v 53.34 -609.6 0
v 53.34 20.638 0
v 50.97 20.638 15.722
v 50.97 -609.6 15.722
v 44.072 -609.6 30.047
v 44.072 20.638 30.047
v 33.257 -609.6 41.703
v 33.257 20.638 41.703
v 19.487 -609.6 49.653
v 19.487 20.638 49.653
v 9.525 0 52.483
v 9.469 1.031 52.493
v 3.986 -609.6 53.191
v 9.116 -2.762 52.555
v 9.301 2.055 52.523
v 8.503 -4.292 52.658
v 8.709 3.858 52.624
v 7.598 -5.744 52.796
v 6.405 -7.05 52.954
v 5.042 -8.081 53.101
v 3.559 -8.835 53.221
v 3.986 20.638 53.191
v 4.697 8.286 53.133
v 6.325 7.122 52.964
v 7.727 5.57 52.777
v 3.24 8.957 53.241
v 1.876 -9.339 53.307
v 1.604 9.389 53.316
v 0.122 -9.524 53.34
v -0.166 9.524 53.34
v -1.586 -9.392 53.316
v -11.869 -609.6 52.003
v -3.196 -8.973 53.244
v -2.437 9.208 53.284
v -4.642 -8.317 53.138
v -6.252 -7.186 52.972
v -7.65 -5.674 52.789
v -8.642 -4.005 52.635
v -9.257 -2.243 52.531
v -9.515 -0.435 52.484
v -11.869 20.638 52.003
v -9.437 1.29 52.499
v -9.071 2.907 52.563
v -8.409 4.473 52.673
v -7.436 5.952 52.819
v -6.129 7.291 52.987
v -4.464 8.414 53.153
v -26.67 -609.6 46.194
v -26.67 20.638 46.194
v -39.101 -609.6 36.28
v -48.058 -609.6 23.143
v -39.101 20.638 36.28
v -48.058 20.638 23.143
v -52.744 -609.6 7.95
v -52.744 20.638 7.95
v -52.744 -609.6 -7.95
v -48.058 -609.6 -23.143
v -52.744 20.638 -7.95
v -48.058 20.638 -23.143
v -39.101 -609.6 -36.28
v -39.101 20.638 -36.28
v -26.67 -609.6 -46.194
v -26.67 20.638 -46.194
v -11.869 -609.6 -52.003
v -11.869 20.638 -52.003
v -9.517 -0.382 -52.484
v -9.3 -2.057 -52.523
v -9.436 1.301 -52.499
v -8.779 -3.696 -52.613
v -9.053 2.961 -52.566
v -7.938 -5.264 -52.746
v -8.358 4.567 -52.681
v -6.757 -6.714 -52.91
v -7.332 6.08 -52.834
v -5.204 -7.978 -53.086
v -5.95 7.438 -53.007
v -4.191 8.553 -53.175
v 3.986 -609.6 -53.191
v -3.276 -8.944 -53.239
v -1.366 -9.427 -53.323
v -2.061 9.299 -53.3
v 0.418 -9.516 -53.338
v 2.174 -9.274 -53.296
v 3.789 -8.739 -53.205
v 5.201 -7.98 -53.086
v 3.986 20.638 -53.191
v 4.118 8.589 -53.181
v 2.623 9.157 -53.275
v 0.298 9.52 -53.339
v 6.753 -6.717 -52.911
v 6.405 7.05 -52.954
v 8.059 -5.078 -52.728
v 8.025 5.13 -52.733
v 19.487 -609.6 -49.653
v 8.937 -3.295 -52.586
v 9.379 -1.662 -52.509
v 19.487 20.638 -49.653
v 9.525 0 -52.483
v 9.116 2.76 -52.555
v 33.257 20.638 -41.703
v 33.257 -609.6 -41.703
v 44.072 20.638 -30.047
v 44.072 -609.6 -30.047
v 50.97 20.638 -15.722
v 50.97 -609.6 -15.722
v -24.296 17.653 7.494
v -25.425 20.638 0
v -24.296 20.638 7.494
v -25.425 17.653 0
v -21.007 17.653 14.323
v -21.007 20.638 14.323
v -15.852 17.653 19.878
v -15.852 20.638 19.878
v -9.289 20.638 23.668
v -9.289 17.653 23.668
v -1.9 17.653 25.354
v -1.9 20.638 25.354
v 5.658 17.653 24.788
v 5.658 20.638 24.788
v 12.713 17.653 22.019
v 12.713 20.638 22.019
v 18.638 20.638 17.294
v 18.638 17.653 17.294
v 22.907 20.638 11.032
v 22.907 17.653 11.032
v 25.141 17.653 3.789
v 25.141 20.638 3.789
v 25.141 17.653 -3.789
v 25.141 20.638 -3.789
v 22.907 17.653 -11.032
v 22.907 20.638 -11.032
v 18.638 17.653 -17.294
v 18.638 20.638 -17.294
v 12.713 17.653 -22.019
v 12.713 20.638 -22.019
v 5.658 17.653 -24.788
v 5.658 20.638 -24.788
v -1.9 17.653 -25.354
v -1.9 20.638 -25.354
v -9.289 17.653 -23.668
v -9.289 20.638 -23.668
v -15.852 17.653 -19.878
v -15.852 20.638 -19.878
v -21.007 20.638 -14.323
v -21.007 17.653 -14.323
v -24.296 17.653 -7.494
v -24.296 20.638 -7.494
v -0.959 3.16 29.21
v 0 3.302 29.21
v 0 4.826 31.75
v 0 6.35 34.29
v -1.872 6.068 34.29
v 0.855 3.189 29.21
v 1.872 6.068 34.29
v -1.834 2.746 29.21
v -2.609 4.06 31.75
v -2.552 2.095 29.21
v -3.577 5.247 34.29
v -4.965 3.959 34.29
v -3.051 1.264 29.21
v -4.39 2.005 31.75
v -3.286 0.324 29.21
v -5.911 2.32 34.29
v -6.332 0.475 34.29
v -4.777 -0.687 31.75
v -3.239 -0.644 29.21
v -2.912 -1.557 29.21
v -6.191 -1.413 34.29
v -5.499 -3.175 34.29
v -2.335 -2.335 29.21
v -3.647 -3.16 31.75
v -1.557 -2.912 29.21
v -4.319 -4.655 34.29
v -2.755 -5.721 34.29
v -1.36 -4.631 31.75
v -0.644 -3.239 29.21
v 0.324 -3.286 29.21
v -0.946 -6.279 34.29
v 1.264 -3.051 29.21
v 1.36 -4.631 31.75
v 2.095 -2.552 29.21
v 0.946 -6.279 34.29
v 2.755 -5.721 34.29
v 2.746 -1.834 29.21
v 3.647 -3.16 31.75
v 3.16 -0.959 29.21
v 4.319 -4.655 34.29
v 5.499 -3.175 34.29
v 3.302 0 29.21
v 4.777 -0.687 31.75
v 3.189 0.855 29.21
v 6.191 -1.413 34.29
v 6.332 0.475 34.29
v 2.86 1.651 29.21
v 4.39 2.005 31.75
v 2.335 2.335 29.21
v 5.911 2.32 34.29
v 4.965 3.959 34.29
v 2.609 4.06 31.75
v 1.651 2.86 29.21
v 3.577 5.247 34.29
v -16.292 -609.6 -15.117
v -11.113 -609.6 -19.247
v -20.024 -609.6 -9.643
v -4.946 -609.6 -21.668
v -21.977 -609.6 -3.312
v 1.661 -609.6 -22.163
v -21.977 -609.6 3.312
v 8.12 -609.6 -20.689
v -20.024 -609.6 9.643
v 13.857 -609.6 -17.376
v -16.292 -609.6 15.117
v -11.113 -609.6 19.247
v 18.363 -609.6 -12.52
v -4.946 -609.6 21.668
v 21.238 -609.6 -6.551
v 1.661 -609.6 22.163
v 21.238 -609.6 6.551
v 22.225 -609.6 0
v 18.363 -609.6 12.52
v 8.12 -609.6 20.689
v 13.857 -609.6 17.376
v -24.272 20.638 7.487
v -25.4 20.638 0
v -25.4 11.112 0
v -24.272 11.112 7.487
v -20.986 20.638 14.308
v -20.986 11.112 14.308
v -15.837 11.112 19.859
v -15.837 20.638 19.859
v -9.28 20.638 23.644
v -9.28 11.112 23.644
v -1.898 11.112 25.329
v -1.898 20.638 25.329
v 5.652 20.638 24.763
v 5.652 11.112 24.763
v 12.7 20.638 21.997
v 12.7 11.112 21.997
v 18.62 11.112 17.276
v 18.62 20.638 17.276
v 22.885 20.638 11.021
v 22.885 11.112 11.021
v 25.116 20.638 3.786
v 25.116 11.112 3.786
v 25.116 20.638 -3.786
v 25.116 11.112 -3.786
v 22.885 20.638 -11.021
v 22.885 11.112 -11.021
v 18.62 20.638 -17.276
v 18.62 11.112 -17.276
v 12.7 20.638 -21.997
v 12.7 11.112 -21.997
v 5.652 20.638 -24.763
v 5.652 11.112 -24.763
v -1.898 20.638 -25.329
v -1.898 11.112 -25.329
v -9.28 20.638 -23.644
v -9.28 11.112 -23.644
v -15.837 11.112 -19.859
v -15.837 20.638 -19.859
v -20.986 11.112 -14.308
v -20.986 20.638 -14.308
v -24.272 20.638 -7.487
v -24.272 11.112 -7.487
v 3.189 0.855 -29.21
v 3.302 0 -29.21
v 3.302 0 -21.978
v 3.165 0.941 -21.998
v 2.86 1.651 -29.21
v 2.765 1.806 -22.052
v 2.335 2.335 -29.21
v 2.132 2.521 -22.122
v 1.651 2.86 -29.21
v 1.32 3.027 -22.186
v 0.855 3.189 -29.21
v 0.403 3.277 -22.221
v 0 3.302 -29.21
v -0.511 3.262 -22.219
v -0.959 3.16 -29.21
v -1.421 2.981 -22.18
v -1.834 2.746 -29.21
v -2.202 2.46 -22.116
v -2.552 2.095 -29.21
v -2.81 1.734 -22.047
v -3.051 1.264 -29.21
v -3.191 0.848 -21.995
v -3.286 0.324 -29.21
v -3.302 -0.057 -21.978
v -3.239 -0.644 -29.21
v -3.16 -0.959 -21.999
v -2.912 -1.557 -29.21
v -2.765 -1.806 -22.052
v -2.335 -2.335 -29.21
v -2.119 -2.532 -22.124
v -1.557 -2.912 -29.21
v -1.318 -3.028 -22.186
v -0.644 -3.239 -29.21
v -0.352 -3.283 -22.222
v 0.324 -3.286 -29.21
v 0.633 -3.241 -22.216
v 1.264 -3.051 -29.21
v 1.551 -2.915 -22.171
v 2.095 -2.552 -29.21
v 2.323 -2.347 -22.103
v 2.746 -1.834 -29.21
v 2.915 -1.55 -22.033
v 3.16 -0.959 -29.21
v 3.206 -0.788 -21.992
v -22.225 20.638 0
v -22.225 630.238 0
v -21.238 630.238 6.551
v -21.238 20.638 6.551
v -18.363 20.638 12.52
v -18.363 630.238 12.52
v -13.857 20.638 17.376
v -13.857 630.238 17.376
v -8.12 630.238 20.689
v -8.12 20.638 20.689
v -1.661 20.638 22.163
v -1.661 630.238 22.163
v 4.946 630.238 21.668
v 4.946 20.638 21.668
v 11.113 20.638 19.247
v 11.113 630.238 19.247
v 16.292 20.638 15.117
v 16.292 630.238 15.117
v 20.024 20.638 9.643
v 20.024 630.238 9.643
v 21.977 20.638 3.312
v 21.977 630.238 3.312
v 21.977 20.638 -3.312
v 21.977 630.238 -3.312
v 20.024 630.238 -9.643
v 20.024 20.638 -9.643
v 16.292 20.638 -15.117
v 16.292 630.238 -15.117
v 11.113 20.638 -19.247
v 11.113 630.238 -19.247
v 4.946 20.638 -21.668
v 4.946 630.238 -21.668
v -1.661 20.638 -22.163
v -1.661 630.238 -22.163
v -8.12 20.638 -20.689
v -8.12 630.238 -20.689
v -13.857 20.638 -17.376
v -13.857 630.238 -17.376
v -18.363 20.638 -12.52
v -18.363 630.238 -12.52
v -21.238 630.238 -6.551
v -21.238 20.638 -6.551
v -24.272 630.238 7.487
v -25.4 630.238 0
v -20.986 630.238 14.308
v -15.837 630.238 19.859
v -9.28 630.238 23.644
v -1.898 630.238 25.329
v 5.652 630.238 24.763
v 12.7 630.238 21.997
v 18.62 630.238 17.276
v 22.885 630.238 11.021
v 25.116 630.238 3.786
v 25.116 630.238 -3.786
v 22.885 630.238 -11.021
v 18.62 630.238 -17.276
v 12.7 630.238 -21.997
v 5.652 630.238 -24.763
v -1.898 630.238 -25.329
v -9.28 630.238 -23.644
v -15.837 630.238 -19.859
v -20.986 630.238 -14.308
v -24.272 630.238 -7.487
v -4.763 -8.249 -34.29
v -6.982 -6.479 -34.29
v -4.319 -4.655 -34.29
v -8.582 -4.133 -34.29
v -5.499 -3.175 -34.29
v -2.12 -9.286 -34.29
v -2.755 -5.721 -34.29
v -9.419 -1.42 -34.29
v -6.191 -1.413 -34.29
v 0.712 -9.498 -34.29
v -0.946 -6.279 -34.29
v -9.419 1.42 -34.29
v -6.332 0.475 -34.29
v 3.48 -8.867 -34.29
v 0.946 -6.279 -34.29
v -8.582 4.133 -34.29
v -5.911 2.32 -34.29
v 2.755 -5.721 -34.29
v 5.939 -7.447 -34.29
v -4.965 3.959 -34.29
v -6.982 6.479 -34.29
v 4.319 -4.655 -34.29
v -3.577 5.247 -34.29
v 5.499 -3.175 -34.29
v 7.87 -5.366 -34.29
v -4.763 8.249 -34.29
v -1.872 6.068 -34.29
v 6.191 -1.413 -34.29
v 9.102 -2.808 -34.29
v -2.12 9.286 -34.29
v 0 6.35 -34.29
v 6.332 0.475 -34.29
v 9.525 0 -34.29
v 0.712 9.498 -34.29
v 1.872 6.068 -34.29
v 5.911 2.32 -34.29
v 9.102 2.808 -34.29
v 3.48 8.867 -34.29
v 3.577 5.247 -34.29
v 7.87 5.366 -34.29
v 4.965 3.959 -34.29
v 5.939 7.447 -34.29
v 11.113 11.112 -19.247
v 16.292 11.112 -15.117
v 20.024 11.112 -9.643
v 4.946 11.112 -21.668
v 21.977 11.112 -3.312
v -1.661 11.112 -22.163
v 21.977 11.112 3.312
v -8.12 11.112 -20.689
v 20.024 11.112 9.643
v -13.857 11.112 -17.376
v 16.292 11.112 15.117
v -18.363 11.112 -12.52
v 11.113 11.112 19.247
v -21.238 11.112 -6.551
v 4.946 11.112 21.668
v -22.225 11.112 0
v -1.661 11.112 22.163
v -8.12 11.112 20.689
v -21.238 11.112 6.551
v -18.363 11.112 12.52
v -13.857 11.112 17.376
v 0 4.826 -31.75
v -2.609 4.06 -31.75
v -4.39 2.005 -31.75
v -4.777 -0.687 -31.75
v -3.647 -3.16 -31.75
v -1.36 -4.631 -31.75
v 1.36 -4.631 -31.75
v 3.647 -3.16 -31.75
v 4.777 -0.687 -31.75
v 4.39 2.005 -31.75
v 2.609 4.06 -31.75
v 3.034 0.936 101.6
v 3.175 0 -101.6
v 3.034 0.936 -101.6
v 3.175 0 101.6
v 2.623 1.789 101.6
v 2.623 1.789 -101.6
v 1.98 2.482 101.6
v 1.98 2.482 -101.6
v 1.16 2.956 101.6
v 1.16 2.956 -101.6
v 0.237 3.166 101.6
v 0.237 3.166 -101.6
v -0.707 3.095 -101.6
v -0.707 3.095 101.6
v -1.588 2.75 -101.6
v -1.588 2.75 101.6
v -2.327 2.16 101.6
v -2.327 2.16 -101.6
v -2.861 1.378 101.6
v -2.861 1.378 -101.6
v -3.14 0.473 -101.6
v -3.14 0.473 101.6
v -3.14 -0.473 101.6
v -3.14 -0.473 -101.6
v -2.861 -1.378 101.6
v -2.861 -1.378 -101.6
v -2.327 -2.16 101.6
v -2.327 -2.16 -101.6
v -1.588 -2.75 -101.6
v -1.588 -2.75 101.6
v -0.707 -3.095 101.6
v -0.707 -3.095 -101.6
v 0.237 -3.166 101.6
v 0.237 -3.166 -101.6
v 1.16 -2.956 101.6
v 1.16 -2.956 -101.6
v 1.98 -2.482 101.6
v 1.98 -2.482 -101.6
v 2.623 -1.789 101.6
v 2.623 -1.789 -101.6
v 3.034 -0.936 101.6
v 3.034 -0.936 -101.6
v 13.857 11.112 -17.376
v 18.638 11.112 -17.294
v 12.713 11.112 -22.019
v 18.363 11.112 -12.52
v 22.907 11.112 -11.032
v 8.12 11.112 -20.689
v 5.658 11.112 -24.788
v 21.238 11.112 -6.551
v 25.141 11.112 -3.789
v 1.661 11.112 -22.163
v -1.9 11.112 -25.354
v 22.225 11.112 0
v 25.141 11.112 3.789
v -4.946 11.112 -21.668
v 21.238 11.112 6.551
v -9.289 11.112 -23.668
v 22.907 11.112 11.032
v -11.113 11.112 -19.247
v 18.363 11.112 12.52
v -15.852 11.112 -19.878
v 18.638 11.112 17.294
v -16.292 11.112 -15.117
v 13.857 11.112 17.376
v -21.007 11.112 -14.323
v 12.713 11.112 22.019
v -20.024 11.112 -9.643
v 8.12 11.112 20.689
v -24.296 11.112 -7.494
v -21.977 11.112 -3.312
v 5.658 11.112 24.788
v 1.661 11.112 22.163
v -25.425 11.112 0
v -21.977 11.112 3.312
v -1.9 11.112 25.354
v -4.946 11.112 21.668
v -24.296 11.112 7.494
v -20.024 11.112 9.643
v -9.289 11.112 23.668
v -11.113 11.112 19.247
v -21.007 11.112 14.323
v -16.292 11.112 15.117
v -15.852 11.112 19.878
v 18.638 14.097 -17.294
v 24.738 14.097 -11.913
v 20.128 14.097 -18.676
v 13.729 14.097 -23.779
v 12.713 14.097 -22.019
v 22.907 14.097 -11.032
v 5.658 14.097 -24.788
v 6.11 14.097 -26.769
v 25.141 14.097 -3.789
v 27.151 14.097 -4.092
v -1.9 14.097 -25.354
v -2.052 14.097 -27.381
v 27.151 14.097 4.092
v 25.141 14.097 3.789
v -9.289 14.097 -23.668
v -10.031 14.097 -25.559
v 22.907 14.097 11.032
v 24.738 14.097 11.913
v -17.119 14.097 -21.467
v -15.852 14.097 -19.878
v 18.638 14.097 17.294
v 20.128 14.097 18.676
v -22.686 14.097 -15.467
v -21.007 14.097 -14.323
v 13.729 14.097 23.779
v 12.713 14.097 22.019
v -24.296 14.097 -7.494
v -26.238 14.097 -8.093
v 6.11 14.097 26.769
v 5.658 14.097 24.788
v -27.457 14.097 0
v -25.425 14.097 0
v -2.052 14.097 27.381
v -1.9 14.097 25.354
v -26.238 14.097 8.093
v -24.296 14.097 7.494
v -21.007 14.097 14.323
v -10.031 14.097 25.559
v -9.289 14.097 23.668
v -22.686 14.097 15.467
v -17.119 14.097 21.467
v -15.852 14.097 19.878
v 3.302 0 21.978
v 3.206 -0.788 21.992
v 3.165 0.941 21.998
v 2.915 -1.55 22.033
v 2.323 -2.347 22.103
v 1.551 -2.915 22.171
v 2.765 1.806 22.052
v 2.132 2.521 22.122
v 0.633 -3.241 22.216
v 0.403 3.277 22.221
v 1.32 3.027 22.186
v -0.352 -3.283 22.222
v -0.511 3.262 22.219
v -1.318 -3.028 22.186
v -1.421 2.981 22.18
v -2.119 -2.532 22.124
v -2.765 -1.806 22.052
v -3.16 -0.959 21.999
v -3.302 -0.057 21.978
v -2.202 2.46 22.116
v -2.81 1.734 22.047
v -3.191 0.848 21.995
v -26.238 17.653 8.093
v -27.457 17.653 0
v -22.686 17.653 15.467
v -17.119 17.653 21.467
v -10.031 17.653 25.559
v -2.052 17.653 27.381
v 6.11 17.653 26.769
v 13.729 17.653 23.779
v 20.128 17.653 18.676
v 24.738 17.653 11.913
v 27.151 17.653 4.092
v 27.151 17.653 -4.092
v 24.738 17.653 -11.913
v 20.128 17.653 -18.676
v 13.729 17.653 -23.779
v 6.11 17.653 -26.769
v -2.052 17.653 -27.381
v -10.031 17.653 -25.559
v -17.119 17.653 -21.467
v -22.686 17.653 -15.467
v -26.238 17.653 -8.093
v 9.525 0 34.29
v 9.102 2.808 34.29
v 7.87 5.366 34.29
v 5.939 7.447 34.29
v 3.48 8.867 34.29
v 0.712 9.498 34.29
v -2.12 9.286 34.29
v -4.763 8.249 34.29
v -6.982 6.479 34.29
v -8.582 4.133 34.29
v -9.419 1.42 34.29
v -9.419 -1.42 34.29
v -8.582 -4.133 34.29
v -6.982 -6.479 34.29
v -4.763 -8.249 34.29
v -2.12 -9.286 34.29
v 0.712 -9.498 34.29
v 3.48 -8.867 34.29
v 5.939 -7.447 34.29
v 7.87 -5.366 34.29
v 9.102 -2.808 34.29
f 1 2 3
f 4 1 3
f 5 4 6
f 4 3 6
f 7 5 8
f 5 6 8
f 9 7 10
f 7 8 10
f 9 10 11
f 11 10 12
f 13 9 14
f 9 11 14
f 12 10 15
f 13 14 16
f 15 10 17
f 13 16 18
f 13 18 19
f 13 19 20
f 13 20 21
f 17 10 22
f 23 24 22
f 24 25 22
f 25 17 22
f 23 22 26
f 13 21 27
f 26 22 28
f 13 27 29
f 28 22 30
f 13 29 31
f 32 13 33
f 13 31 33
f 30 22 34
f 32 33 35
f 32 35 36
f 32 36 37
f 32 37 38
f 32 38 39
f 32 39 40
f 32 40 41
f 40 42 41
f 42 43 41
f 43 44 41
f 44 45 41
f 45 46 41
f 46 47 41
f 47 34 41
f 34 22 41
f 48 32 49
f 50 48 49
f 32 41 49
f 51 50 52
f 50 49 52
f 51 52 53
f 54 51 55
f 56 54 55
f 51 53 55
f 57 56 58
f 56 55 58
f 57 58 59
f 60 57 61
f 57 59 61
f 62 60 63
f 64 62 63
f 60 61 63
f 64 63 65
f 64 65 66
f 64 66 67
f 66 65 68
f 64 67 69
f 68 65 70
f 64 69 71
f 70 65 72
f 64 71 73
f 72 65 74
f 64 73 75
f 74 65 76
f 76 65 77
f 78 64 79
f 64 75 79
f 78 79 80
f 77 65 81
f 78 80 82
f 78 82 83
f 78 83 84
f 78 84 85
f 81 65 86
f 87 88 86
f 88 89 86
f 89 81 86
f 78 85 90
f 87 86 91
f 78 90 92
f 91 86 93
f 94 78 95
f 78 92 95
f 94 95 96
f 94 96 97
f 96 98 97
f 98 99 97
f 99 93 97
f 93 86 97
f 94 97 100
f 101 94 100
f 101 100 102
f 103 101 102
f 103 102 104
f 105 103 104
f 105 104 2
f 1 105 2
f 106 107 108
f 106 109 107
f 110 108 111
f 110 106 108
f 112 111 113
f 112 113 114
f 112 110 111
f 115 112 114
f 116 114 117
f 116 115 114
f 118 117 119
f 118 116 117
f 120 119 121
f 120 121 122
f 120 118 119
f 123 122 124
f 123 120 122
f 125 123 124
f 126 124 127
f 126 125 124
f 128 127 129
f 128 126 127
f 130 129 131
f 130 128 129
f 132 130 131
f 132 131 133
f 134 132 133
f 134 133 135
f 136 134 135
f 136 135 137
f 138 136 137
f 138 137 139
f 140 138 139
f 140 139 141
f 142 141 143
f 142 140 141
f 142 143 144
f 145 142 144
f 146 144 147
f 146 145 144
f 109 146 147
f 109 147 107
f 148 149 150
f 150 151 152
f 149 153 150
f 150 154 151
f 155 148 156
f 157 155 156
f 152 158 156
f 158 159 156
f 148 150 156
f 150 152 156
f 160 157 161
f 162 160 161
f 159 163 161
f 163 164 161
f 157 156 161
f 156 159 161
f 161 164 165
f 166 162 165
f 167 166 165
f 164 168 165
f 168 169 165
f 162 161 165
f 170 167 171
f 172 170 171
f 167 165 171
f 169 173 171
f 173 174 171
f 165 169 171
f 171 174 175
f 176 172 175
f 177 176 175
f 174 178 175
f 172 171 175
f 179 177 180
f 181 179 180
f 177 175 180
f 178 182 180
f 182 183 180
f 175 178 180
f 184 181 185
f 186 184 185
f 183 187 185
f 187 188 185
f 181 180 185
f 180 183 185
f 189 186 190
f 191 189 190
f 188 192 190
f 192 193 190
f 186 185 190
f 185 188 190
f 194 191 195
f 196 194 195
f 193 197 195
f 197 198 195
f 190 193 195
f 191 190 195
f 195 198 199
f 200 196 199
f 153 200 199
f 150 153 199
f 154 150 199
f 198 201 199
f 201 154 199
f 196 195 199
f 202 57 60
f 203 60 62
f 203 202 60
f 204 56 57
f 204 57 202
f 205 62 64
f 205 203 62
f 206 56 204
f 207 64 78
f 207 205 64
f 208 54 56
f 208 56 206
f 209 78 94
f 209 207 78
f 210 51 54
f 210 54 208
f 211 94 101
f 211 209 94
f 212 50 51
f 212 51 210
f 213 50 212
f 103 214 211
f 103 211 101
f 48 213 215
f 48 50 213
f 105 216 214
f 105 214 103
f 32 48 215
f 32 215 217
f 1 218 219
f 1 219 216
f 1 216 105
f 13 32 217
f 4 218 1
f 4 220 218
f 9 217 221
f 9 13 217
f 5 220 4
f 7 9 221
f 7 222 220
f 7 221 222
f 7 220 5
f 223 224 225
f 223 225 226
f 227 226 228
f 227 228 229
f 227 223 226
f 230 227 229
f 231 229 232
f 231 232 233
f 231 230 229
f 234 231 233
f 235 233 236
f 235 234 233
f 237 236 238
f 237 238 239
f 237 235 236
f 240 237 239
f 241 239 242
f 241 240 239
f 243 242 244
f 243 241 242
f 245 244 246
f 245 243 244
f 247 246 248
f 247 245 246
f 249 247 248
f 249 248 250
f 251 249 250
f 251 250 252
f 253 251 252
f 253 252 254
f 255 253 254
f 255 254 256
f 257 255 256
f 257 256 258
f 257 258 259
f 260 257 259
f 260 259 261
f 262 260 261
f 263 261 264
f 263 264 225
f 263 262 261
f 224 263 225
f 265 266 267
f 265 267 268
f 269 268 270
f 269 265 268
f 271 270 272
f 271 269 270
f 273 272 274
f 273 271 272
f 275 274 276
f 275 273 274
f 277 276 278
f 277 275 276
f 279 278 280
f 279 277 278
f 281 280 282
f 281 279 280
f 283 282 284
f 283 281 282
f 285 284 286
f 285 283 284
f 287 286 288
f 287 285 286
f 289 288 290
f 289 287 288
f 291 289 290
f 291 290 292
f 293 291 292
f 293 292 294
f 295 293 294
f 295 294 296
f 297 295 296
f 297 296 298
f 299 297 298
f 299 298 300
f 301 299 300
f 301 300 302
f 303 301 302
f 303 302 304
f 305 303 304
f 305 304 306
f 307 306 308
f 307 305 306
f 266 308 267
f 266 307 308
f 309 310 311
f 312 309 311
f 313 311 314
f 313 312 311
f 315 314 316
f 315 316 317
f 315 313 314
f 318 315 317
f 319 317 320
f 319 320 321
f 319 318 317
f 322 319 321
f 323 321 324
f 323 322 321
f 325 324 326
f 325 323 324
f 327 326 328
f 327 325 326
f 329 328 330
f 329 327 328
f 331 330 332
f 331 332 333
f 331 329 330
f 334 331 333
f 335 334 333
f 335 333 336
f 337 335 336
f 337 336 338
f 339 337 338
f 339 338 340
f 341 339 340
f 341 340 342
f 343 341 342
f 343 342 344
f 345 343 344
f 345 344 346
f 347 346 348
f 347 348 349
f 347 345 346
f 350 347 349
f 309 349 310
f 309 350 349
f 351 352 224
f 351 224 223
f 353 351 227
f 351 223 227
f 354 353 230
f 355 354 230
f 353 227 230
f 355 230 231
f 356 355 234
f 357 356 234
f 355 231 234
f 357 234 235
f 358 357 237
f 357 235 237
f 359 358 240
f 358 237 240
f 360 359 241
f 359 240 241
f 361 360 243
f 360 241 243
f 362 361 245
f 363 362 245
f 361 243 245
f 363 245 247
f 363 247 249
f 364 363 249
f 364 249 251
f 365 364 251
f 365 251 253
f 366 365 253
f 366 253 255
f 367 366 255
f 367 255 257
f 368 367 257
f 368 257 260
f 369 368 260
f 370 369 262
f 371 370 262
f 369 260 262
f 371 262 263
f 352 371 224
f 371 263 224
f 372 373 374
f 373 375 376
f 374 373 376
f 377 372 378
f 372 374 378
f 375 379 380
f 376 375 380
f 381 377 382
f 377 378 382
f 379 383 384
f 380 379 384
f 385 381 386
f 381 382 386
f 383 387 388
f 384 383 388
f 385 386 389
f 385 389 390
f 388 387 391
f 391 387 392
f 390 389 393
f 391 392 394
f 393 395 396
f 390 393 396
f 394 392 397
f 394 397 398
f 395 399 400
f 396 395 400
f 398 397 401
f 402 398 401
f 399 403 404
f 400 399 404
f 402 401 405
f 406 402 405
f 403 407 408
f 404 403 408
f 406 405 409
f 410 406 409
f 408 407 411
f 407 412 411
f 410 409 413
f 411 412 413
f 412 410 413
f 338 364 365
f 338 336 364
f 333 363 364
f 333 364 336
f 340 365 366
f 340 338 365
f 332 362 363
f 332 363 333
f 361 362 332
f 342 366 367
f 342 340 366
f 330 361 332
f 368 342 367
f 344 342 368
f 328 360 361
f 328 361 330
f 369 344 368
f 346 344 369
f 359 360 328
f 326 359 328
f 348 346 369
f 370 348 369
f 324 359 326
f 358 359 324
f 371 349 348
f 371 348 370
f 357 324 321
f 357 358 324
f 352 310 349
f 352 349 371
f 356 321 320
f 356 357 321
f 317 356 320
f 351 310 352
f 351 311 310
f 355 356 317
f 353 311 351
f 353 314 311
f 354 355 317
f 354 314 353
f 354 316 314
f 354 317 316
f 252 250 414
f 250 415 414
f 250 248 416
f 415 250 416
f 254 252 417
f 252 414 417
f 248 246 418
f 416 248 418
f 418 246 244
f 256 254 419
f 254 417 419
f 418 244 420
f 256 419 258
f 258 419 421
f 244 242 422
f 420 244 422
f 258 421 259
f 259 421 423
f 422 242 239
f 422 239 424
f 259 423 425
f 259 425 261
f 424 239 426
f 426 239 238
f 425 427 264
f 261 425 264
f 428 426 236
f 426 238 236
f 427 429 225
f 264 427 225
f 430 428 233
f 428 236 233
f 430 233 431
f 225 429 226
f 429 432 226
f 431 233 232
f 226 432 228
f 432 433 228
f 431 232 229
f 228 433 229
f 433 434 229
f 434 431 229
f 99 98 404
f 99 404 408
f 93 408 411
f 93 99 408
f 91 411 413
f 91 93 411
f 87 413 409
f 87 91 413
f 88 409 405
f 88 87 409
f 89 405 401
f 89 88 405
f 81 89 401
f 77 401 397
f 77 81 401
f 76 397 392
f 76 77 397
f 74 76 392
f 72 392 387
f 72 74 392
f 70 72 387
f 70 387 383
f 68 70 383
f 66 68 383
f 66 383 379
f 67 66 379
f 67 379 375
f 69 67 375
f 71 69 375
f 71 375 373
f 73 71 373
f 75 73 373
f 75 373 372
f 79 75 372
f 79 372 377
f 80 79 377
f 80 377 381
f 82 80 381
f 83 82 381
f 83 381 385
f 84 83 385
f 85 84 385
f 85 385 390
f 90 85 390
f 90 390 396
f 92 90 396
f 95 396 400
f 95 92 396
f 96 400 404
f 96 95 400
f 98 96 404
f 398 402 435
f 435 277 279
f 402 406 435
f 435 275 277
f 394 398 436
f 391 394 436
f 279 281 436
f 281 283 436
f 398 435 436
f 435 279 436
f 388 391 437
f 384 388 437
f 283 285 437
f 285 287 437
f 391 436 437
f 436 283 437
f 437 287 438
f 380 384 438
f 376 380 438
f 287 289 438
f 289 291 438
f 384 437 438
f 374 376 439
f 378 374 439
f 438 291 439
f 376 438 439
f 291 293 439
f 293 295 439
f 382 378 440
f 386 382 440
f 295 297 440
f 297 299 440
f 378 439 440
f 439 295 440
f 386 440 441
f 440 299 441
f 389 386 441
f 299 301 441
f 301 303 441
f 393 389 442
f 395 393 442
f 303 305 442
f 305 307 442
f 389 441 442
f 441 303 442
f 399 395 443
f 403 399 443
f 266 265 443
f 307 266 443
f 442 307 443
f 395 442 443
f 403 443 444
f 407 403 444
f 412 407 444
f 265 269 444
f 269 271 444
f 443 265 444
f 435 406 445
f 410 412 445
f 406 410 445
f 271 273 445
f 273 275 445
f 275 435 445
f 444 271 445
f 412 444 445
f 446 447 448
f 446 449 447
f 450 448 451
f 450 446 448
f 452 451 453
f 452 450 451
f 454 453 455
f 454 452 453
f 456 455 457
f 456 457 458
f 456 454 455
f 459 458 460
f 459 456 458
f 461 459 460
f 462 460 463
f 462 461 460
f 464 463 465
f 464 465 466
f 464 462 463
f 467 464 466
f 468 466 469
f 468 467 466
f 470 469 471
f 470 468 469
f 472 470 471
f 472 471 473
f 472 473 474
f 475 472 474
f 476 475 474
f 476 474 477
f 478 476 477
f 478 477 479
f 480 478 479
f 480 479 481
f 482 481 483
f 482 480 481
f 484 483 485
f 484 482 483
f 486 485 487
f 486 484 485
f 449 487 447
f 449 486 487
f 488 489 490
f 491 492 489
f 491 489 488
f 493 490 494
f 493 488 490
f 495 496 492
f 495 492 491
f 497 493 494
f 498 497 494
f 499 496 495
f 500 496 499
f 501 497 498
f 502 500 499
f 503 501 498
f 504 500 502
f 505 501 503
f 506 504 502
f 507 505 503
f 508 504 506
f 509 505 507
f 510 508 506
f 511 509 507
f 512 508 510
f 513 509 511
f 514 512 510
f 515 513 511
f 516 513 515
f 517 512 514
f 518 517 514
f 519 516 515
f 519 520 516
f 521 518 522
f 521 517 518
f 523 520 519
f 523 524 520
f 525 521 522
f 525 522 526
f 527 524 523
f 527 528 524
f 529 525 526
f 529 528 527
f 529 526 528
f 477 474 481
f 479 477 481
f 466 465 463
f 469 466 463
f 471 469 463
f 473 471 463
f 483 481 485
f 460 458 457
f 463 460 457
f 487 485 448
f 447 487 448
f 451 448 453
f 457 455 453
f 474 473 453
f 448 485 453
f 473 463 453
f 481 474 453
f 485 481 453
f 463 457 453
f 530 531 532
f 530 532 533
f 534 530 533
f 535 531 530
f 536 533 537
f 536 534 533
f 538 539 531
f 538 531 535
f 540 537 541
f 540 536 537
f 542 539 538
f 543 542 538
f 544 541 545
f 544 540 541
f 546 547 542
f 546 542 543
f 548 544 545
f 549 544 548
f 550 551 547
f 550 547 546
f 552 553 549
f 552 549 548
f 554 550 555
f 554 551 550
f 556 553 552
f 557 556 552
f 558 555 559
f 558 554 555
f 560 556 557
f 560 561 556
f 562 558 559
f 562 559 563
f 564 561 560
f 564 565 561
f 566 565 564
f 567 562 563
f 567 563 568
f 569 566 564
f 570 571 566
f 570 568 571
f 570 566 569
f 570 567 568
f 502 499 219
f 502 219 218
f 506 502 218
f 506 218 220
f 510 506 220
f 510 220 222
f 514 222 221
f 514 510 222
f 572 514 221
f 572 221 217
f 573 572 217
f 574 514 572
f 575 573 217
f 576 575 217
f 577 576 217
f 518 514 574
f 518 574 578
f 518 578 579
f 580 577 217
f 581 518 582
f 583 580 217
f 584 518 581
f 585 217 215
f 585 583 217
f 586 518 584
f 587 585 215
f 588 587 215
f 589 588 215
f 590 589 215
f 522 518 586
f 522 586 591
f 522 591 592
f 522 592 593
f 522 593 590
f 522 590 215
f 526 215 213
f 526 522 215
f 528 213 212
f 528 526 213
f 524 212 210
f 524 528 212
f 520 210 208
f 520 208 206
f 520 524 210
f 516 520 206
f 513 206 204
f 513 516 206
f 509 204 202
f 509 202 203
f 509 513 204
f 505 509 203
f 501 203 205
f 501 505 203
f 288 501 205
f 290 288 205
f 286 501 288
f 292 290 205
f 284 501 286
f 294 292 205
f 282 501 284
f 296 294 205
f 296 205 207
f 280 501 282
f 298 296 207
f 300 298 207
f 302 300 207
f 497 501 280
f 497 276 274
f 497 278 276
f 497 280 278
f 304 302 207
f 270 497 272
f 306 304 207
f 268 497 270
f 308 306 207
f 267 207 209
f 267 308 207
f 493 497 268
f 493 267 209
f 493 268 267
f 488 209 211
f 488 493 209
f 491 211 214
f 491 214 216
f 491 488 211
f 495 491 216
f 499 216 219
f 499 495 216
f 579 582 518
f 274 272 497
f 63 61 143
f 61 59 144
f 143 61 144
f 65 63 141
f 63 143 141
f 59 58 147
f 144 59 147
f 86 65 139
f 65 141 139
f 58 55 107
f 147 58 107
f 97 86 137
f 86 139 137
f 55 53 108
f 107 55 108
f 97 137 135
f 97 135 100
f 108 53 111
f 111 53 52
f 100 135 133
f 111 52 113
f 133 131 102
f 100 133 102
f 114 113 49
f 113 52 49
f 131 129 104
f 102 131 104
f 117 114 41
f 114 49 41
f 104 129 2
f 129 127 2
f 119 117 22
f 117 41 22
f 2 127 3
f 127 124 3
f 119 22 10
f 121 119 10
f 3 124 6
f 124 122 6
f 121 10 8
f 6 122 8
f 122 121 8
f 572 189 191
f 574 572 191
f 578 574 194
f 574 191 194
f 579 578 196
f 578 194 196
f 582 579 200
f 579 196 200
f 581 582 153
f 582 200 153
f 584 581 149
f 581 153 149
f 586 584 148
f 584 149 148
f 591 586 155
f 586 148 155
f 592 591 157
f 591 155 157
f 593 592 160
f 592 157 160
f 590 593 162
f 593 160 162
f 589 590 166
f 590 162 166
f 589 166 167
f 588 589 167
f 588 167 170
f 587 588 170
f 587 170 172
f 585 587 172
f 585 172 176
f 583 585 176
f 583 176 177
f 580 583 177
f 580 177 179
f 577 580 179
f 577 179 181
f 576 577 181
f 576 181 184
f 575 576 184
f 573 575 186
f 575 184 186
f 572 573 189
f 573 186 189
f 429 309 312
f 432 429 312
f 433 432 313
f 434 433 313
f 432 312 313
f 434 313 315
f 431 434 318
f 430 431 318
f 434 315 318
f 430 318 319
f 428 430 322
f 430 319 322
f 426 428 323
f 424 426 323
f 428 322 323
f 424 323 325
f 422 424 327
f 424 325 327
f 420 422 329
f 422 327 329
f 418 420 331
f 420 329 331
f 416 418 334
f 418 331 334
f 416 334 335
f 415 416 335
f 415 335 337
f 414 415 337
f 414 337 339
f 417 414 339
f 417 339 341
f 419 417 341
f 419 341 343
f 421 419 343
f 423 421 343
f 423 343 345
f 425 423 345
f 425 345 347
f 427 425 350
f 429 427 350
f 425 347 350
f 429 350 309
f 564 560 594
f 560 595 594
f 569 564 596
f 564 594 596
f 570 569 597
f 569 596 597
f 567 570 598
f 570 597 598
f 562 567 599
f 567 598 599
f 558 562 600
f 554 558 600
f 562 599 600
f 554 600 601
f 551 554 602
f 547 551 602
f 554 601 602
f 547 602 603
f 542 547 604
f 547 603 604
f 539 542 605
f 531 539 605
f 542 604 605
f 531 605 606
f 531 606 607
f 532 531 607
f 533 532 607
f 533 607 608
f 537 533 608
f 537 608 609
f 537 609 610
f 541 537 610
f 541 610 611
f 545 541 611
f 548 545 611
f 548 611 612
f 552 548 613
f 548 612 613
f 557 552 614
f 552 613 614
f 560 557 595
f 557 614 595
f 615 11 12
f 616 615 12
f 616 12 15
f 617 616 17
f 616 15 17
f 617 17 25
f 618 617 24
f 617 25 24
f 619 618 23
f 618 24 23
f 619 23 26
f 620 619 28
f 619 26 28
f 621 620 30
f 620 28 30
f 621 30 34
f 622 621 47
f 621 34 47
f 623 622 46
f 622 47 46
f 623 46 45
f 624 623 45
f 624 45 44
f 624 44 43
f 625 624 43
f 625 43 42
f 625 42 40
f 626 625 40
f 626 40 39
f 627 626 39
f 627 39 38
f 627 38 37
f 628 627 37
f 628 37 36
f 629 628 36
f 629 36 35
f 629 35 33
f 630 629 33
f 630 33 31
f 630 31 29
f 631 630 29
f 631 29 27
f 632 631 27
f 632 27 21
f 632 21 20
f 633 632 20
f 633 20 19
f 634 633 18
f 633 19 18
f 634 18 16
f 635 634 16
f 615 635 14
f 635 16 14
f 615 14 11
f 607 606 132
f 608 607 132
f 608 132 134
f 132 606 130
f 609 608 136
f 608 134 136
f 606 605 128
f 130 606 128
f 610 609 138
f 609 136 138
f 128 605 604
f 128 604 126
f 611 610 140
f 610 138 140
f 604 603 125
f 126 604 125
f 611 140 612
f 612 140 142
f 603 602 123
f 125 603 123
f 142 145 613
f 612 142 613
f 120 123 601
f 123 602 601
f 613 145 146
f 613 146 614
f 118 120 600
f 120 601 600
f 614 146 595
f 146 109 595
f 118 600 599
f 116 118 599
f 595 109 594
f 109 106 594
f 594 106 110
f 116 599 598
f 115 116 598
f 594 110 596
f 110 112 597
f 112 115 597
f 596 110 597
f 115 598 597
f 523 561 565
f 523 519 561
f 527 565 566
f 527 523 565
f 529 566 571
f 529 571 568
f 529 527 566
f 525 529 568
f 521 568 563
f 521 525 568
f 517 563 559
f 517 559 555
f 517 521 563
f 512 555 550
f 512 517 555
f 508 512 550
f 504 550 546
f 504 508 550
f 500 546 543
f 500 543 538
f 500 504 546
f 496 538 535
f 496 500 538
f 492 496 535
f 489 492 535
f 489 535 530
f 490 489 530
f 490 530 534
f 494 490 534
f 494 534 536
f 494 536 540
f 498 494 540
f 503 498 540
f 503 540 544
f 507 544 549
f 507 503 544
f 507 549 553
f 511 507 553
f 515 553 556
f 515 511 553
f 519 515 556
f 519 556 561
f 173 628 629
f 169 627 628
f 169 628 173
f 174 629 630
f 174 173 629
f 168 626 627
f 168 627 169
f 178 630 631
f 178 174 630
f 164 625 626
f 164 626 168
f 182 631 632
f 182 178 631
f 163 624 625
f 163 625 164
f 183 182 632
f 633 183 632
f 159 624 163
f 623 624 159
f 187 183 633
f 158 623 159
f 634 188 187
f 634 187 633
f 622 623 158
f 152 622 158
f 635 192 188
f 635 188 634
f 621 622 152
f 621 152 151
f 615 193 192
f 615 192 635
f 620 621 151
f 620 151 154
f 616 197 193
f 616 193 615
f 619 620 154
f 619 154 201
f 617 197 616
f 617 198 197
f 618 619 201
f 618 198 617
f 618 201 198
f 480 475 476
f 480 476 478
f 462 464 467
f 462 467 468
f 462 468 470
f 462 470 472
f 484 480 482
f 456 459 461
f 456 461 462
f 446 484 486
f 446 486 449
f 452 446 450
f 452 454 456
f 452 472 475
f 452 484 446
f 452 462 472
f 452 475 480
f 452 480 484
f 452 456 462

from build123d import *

# Parameters (mm, degrees)
F0_R      = 53.34
F0_R_2    = 22.225
F1_DEPTH  = 20.6375
F6_DEPTH  = 609.6
F5_R      = 9.525
F5_R_2    = 3.302
F7_DEPTH  = 19.05
F8_DEPTH  = 32.3616602869
F4_R      = 9.525
F4_R_2    = 3.302
F9_DEPTH  = 19.05
F10_DEPTH = 32.3616602869
F13_W     = 2.032
F13_H     = 3.556
F15_R     = 3.175
F16_DEPTH = 101.6
F19_R     = 25.4
F19_R_2   = 22.225
F20_DEPTH = 9.525
F21_DEPTH = 609.6


# Not quite as in the source:
# - the program builds the solid bodies; features that only make, move or delete a surface that nothing else refers to are left out


with BuildPart() as f1:
    # F0 (on Front) → F1 (new body)
    with BuildSketch(Plane.XZ):
        Circle(F0_R)
        Circle(F0_R_2, mode=Mode.SUBTRACT)
    extrude(amount=-F1_DEPTH)

    # F0 (on Front) → F6 (join)
    with BuildSketch(Plane.XZ):
        Circle(F0_R)
        Circle(F0_R_2, mode=Mode.SUBTRACT)
    extrude(amount=F6_DEPTH)

    # F5 (on offset) → F7 (cut)
    with BuildSketch(Plane.XY.offset(-53.34)):
        Circle(F5_R)
        Circle(F5_R_2, mode=Mode.SUBTRACT)
        Circle(F5_R_2)
    extrude(amount=F7_DEPTH, mode=Mode.SUBTRACT)

    # F5 (on offset) → F8 (cut, up to face)
    with BuildSketch(Plane.XY.offset(-53.34)):
        Circle(F5_R_2)
    extrude(amount=F8_DEPTH, mode=Mode.SUBTRACT)

    # F4 (on offset) → F9 (cut)
    with BuildSketch(Plane.XY.offset(53.34)):
        Circle(F4_R)
        Circle(F4_R_2, mode=Mode.SUBTRACT)
        Circle(F4_R_2)
    extrude(amount=-F9_DEPTH, mode=Mode.SUBTRACT)

    # F4 (on offset) → F10 (cut, up to face)
    with BuildSketch(Plane.XY.offset(53.34)):
        Circle(F4_R_2)
    extrude(amount=-F10_DEPTH, mode=Mode.SUBTRACT)

    # F11 (on Right) → F12 (revolve, cut)
    with BuildSketch(Plane.YZ):
        Polygon((6.35, 34.29), (3.302, 34.29), (3.302, 29.21), align=None)
        Polygon((3.302, -29.21), (3.302, -34.29), (6.35, -34.29), align=None)
    revolve(axis=Axis((0, 0, 6.9711627439), (0, 0, 1)), mode=Mode.SUBTRACT)

    # F13 (on Top) → F14 (revolve, cut)
    with BuildSketch(Plane.XY):
        Polygon((-25.4254, 11.1125), (-22.225, 11.1125), (-22.225, 20.6375), (-25.4254, 20.6375), (-25.4254, 17.653), (-25.4254, 14.097), align=None)
        with Locations((-26.4414, 15.875)):
            Rectangle(F13_W, F13_H)
    revolve(axis=Axis((0, 5.55625, 0), (0, 1, 0)), mode=Mode.SUBTRACT)


with BuildPart() as f16:
    # F15 (on Top) → F16 (new body, symmetric)
    with BuildSketch(Plane.XY):
        Circle(F15_R)
    extrude(amount=F16_DEPTH, both=True)


with BuildPart() as f20:
    # F19 (on face) → F20 (new body)
    with BuildSketch(Plane(origin=(0, 20.6375, 0), x_dir=(-1, 0, 0), z_dir=(0, 1, 0))):
        Circle(F19_R)
        Circle(F19_R_2, mode=Mode.SUBTRACT)
    extrude(amount=-F20_DEPTH)

    # F21 (add): a face of the model
    f21_faces = [f20.faces().sort_by_distance(p)[0] for p in [
        (24.6815795103, 20.6375, 0),
    ]]
    extrude(f21_faces, amount=F21_DEPTH)


solid = Compound([f1.part, f16.part, f20.part])
